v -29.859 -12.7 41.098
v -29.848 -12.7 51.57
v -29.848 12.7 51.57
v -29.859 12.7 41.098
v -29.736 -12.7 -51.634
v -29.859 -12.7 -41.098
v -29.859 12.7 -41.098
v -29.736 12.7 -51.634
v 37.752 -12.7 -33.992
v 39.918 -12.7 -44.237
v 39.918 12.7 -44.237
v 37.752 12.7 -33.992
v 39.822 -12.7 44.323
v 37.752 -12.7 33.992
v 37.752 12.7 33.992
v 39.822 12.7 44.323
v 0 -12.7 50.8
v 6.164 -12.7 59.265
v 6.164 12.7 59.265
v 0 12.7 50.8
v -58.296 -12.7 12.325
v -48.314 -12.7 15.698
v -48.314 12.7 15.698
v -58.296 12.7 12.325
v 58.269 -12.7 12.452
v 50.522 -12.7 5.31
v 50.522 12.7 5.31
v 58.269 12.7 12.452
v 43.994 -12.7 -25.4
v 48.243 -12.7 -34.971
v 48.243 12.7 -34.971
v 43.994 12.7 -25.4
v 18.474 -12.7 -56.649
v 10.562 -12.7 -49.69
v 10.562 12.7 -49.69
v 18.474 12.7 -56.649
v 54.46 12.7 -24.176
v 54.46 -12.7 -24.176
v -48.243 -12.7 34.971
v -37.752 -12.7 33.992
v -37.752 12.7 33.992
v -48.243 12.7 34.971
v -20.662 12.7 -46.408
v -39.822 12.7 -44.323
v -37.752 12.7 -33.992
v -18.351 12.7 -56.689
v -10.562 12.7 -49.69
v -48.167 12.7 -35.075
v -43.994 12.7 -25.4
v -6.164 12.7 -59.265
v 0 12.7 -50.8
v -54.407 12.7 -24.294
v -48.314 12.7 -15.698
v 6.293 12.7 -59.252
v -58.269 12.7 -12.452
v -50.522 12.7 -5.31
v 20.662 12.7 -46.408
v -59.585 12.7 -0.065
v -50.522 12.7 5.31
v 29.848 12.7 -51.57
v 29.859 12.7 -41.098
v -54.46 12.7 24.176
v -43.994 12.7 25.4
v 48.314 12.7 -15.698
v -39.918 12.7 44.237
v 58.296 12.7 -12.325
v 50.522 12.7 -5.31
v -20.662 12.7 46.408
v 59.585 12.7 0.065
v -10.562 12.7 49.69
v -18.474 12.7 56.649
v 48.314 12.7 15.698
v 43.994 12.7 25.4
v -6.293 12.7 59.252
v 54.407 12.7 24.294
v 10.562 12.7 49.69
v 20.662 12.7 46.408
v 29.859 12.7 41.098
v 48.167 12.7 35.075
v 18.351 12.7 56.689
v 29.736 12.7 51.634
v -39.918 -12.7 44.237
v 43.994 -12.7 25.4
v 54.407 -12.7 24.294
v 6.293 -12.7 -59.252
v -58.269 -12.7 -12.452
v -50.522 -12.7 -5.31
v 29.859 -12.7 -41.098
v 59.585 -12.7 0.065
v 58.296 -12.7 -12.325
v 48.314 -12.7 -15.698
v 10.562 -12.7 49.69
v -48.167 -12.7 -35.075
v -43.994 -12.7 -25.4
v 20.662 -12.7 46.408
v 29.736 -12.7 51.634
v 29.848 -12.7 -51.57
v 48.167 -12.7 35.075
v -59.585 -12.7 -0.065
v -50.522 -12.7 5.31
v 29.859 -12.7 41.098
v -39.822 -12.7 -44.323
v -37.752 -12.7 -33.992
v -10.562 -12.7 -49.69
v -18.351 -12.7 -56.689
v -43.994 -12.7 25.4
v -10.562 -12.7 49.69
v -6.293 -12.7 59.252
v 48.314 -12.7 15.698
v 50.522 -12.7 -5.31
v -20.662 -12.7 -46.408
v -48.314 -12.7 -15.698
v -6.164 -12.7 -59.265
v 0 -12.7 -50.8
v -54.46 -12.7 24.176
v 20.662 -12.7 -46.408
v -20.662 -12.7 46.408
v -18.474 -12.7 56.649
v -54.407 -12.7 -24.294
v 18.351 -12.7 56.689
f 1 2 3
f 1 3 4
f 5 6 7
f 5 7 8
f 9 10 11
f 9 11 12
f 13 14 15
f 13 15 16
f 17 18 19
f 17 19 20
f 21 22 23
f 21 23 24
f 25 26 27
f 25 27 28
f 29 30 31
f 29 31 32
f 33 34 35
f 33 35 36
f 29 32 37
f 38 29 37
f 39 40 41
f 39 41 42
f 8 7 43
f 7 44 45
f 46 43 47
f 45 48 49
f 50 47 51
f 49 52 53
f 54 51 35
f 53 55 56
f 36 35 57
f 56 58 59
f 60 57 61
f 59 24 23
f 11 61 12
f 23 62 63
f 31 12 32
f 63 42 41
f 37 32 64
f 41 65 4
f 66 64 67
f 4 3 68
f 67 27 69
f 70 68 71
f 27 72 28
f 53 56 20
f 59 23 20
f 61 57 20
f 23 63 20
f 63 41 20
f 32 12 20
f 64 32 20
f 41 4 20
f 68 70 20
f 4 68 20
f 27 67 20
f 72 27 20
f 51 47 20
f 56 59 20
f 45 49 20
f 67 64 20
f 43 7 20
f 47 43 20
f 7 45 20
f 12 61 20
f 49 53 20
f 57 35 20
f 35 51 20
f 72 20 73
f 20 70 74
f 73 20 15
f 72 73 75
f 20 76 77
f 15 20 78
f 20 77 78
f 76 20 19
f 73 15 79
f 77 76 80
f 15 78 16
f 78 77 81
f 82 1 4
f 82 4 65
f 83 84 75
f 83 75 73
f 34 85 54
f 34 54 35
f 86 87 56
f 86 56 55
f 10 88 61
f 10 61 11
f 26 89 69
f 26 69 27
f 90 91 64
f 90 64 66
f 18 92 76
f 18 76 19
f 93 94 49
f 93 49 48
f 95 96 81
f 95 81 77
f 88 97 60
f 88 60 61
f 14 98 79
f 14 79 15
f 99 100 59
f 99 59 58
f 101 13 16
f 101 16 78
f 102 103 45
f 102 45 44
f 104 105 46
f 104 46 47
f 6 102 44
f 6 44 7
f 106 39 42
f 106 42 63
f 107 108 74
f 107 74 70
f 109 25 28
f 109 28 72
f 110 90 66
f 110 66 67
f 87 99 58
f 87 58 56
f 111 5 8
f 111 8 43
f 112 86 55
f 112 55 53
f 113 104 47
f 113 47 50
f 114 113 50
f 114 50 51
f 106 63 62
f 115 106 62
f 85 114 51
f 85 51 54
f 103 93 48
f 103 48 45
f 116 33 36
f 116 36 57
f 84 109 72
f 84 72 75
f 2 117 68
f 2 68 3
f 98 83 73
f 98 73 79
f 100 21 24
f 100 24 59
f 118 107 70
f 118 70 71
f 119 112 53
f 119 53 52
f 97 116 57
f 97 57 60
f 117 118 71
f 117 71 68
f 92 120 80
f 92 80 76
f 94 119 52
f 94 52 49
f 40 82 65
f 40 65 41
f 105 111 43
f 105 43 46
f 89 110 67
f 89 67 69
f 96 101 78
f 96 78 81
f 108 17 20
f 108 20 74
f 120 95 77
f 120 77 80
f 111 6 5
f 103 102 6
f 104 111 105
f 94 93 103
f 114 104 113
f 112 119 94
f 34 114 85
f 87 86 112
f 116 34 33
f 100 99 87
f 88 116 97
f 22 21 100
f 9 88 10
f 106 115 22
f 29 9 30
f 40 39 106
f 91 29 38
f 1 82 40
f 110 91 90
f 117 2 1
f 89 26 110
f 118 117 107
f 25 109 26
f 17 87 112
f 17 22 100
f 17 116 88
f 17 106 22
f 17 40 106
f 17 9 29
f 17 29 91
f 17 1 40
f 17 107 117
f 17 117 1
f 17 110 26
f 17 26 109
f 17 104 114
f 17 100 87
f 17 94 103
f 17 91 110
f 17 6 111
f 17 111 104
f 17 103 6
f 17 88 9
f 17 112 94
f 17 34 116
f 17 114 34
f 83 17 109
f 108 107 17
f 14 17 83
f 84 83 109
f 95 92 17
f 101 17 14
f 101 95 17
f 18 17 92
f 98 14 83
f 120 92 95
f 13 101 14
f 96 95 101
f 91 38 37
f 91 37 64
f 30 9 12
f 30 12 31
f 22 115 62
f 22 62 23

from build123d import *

# Parameters (mm, degrees)
F0_R            = 50.8
F1_DEPTH        = 12.7
F3_DEPTH        = 25.4
F3_COPIES_COUNT = 30


# Not quite as in the source:
# - a pattern or mirror of a feature is missing from the dataset's text; its kind, count and spacing are read off the source's solid


with BuildPart() as f1:
    # F0 (on Front) → F1 (new body, symmetric)
    with BuildSketch(Plane.XZ):
        Circle(F0_R)
    extrude(amount=F1_DEPTH, both=True)

    # F2 (on face) → F3 (join)
    with BuildSketch(Plane.XZ.offset(12.7)):
        with BuildLine():
            ThreePointArc((0, 50.8), (5.310045934, 50.5217122847), (10.5619138935, 49.6898981173))
            Line((10.5619138935, 49.6898981173), (6.1639756896, 59.2651665211))
            Line((6.1639756896, 59.2651665211), (0, 50.8))
        make_face()
    f3 = extrude(amount=-F3_DEPTH)

    # F3_copies: F3 ×30 about axis
    f3_copies_axis = Axis((0, 0, 0), (0, 1, 0))
    for i in range(1, F3_COPIES_COUNT):
        add(f3.rotate(f3_copies_axis, i * 360 / F3_COPIES_COUNT))


solid = f1.part
